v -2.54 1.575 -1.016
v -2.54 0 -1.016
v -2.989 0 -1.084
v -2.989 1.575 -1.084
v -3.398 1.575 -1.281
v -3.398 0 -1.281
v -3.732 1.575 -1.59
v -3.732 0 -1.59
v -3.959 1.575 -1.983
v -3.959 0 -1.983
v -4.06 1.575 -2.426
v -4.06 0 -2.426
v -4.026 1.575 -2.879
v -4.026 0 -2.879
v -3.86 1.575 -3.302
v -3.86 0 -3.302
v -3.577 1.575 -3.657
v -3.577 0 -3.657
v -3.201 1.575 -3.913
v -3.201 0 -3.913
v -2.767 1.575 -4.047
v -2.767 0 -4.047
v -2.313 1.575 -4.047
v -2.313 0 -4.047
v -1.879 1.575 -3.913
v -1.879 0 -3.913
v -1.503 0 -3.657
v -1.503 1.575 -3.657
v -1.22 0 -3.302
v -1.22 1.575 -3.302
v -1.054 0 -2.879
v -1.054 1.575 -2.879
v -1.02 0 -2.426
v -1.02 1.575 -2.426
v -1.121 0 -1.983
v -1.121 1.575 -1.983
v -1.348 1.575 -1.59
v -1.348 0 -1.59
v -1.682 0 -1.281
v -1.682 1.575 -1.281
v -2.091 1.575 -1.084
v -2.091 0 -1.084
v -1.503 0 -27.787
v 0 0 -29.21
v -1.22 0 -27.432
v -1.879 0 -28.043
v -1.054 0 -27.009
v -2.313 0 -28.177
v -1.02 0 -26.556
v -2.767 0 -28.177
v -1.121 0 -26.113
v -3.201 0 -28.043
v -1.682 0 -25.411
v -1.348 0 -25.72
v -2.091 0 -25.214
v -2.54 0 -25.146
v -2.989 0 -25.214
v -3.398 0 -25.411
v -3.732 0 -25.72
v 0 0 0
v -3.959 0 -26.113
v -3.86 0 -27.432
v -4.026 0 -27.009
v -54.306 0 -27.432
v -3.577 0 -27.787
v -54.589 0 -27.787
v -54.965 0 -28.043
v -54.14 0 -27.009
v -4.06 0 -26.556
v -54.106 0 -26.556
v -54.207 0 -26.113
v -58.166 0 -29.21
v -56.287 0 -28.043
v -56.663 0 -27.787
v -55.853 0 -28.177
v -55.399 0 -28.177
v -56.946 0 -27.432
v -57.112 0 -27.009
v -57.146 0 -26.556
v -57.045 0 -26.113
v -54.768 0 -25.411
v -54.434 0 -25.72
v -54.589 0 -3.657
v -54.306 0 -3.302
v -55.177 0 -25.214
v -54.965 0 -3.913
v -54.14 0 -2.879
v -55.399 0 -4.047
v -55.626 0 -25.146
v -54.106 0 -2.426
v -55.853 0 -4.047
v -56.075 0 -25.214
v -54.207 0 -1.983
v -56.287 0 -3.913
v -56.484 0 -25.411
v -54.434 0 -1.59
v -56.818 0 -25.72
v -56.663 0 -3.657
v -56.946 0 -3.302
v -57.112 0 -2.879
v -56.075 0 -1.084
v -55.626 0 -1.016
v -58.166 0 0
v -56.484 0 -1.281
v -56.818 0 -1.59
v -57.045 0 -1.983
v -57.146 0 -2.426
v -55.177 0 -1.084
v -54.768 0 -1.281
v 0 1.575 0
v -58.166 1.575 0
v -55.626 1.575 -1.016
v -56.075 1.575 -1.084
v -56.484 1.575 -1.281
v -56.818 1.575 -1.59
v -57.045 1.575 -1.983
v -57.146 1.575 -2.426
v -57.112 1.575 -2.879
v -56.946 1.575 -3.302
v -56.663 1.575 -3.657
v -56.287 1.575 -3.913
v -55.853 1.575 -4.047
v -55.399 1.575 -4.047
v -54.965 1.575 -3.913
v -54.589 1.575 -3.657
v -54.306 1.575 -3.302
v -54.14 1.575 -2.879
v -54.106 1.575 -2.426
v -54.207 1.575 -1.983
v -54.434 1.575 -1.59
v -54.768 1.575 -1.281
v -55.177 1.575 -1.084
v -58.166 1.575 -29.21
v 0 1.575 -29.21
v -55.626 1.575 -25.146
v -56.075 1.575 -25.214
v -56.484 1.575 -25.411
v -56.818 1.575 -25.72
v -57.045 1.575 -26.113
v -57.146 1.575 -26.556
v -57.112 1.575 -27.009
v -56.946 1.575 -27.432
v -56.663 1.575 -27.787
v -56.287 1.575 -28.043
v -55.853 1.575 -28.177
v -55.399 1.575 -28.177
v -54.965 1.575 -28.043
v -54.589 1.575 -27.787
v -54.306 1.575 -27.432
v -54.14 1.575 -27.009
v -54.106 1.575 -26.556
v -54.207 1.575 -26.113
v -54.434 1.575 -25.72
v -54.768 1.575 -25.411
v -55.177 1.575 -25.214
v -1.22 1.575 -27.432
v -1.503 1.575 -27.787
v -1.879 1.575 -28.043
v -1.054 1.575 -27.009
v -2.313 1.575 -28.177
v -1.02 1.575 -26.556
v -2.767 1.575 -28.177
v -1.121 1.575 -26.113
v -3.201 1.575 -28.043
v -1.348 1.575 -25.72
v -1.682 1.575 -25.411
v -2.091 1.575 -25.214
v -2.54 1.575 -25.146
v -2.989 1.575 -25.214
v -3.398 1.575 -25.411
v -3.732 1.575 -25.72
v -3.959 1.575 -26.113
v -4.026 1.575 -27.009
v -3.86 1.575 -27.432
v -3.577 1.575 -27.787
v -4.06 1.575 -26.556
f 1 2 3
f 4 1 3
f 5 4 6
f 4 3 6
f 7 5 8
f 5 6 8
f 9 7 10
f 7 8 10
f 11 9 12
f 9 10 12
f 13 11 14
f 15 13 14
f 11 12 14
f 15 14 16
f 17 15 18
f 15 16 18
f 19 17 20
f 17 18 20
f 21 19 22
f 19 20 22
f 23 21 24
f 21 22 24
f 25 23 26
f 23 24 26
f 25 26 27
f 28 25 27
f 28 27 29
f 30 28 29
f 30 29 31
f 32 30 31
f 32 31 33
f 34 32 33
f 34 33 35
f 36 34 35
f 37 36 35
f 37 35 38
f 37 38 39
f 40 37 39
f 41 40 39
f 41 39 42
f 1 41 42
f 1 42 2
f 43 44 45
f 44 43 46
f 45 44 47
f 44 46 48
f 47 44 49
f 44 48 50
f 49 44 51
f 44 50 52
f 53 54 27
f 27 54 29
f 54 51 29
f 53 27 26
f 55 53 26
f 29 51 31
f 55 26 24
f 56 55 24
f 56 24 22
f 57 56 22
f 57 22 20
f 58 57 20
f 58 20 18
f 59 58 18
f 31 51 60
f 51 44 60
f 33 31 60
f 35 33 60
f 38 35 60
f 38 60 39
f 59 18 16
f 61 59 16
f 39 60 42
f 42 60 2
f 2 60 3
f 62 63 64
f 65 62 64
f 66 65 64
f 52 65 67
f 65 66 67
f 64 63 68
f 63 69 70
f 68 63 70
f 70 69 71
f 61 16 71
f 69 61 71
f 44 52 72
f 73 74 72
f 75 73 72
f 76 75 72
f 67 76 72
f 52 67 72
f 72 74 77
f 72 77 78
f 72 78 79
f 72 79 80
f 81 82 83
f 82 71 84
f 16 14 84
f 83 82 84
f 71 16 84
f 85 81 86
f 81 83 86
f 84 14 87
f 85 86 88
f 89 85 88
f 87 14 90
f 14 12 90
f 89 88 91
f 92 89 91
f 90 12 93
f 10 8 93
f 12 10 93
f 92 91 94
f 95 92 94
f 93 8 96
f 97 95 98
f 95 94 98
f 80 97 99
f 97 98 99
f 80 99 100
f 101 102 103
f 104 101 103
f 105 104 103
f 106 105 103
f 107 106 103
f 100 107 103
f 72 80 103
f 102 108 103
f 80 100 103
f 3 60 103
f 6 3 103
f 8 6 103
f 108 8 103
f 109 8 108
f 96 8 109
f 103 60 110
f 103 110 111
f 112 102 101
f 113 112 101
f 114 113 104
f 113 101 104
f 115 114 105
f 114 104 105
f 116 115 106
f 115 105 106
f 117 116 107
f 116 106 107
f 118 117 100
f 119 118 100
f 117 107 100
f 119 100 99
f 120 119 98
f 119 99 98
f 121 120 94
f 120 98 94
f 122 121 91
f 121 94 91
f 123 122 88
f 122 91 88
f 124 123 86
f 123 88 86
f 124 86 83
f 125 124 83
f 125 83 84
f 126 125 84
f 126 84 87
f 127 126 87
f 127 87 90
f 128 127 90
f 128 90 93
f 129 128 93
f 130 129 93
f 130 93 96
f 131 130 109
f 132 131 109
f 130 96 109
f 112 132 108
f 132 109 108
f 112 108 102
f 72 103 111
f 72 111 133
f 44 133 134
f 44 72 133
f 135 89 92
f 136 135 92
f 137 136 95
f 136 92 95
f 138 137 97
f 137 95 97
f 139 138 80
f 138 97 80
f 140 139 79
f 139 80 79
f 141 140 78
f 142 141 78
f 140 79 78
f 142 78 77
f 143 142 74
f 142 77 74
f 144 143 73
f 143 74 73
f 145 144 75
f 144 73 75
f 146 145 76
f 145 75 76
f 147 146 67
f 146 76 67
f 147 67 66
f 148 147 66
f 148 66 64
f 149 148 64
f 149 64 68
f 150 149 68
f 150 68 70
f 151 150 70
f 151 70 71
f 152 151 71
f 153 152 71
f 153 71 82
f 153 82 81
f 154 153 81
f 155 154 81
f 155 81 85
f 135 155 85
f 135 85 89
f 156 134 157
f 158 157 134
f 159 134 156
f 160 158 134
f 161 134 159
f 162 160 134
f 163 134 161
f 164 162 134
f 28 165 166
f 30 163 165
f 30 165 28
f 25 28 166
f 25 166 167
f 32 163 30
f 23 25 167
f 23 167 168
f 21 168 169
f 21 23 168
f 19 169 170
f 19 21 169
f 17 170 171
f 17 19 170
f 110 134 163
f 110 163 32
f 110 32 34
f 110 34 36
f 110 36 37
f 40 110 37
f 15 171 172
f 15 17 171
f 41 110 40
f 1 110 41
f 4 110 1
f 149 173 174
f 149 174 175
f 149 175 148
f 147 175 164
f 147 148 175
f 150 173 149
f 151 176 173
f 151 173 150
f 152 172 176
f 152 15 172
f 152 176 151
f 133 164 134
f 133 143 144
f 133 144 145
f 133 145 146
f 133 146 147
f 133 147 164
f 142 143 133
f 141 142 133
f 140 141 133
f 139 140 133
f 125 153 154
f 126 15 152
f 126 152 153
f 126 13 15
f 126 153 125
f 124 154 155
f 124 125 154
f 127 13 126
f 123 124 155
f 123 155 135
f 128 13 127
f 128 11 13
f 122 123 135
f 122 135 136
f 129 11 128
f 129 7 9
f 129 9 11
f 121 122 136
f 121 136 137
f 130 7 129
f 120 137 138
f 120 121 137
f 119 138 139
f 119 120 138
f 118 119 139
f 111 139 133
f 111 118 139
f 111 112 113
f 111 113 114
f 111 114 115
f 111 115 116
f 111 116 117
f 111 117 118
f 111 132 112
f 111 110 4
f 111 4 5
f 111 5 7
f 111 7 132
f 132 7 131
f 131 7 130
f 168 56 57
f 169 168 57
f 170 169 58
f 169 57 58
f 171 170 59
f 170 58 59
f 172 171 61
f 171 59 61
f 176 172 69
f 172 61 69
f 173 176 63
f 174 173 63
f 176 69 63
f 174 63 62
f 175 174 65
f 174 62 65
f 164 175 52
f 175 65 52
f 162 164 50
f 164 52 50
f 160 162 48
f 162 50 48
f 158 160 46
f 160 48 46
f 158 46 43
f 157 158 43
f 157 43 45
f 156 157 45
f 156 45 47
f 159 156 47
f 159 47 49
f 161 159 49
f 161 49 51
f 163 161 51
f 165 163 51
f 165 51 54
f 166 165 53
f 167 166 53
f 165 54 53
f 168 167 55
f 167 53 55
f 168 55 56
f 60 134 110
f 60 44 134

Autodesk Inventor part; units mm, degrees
ref_plane "YZ Plane" through (0, 0, 0) normal (1, 0, 0) x (0, 1, 0)
ref_plane "XZ Plane" through (0, 0, 0) normal (0, 1, 0) x (-1, 0, 0)
ref_plane "XY Plane" through (0, 0, 0) normal (0, 0, 1) x (1, 0, 0)
sketch "Sketch1" plane through (0, 0, 0) normal (0, 1, 0) x (-1, 0, 0)
  line L0 (0, 0) -> (58.166, 0)
  line L1 (58.166, 0) -> (58.166, -29.21)
  line L2 (58.166, -29.21) -> (0, -29.21)
  line L3 (0, -29.21) -> (0, 0)
  dimension "d0" = 58.166
  dimension "d1" = 29.21
extrude "Extrusion1" add sketch "Sketch1" along normal blind 1.5748
hole "Hole1" at (-55.626, 1.5748, -2.54) direction (0, -1, 0) diameter 3.048 depth 25.4 tip angle 118
hole "Hole2" at (-55.626, 1.5748, -26.67) direction (0, -1, 0) diameter 3.048 depth 25.4 tip angle 118
hole "Hole3" at (-2.54, 1.5748, -26.67) direction (0, -1, 0) diameter 3.048 depth 25.4 tip angle 118
hole "Hole4" at (-2.54, 1.5748, -2.54) direction (0, -1, 0) diameter 3.048 depth 25.4 tip angle 118
properties part number "firebeetle_board"
